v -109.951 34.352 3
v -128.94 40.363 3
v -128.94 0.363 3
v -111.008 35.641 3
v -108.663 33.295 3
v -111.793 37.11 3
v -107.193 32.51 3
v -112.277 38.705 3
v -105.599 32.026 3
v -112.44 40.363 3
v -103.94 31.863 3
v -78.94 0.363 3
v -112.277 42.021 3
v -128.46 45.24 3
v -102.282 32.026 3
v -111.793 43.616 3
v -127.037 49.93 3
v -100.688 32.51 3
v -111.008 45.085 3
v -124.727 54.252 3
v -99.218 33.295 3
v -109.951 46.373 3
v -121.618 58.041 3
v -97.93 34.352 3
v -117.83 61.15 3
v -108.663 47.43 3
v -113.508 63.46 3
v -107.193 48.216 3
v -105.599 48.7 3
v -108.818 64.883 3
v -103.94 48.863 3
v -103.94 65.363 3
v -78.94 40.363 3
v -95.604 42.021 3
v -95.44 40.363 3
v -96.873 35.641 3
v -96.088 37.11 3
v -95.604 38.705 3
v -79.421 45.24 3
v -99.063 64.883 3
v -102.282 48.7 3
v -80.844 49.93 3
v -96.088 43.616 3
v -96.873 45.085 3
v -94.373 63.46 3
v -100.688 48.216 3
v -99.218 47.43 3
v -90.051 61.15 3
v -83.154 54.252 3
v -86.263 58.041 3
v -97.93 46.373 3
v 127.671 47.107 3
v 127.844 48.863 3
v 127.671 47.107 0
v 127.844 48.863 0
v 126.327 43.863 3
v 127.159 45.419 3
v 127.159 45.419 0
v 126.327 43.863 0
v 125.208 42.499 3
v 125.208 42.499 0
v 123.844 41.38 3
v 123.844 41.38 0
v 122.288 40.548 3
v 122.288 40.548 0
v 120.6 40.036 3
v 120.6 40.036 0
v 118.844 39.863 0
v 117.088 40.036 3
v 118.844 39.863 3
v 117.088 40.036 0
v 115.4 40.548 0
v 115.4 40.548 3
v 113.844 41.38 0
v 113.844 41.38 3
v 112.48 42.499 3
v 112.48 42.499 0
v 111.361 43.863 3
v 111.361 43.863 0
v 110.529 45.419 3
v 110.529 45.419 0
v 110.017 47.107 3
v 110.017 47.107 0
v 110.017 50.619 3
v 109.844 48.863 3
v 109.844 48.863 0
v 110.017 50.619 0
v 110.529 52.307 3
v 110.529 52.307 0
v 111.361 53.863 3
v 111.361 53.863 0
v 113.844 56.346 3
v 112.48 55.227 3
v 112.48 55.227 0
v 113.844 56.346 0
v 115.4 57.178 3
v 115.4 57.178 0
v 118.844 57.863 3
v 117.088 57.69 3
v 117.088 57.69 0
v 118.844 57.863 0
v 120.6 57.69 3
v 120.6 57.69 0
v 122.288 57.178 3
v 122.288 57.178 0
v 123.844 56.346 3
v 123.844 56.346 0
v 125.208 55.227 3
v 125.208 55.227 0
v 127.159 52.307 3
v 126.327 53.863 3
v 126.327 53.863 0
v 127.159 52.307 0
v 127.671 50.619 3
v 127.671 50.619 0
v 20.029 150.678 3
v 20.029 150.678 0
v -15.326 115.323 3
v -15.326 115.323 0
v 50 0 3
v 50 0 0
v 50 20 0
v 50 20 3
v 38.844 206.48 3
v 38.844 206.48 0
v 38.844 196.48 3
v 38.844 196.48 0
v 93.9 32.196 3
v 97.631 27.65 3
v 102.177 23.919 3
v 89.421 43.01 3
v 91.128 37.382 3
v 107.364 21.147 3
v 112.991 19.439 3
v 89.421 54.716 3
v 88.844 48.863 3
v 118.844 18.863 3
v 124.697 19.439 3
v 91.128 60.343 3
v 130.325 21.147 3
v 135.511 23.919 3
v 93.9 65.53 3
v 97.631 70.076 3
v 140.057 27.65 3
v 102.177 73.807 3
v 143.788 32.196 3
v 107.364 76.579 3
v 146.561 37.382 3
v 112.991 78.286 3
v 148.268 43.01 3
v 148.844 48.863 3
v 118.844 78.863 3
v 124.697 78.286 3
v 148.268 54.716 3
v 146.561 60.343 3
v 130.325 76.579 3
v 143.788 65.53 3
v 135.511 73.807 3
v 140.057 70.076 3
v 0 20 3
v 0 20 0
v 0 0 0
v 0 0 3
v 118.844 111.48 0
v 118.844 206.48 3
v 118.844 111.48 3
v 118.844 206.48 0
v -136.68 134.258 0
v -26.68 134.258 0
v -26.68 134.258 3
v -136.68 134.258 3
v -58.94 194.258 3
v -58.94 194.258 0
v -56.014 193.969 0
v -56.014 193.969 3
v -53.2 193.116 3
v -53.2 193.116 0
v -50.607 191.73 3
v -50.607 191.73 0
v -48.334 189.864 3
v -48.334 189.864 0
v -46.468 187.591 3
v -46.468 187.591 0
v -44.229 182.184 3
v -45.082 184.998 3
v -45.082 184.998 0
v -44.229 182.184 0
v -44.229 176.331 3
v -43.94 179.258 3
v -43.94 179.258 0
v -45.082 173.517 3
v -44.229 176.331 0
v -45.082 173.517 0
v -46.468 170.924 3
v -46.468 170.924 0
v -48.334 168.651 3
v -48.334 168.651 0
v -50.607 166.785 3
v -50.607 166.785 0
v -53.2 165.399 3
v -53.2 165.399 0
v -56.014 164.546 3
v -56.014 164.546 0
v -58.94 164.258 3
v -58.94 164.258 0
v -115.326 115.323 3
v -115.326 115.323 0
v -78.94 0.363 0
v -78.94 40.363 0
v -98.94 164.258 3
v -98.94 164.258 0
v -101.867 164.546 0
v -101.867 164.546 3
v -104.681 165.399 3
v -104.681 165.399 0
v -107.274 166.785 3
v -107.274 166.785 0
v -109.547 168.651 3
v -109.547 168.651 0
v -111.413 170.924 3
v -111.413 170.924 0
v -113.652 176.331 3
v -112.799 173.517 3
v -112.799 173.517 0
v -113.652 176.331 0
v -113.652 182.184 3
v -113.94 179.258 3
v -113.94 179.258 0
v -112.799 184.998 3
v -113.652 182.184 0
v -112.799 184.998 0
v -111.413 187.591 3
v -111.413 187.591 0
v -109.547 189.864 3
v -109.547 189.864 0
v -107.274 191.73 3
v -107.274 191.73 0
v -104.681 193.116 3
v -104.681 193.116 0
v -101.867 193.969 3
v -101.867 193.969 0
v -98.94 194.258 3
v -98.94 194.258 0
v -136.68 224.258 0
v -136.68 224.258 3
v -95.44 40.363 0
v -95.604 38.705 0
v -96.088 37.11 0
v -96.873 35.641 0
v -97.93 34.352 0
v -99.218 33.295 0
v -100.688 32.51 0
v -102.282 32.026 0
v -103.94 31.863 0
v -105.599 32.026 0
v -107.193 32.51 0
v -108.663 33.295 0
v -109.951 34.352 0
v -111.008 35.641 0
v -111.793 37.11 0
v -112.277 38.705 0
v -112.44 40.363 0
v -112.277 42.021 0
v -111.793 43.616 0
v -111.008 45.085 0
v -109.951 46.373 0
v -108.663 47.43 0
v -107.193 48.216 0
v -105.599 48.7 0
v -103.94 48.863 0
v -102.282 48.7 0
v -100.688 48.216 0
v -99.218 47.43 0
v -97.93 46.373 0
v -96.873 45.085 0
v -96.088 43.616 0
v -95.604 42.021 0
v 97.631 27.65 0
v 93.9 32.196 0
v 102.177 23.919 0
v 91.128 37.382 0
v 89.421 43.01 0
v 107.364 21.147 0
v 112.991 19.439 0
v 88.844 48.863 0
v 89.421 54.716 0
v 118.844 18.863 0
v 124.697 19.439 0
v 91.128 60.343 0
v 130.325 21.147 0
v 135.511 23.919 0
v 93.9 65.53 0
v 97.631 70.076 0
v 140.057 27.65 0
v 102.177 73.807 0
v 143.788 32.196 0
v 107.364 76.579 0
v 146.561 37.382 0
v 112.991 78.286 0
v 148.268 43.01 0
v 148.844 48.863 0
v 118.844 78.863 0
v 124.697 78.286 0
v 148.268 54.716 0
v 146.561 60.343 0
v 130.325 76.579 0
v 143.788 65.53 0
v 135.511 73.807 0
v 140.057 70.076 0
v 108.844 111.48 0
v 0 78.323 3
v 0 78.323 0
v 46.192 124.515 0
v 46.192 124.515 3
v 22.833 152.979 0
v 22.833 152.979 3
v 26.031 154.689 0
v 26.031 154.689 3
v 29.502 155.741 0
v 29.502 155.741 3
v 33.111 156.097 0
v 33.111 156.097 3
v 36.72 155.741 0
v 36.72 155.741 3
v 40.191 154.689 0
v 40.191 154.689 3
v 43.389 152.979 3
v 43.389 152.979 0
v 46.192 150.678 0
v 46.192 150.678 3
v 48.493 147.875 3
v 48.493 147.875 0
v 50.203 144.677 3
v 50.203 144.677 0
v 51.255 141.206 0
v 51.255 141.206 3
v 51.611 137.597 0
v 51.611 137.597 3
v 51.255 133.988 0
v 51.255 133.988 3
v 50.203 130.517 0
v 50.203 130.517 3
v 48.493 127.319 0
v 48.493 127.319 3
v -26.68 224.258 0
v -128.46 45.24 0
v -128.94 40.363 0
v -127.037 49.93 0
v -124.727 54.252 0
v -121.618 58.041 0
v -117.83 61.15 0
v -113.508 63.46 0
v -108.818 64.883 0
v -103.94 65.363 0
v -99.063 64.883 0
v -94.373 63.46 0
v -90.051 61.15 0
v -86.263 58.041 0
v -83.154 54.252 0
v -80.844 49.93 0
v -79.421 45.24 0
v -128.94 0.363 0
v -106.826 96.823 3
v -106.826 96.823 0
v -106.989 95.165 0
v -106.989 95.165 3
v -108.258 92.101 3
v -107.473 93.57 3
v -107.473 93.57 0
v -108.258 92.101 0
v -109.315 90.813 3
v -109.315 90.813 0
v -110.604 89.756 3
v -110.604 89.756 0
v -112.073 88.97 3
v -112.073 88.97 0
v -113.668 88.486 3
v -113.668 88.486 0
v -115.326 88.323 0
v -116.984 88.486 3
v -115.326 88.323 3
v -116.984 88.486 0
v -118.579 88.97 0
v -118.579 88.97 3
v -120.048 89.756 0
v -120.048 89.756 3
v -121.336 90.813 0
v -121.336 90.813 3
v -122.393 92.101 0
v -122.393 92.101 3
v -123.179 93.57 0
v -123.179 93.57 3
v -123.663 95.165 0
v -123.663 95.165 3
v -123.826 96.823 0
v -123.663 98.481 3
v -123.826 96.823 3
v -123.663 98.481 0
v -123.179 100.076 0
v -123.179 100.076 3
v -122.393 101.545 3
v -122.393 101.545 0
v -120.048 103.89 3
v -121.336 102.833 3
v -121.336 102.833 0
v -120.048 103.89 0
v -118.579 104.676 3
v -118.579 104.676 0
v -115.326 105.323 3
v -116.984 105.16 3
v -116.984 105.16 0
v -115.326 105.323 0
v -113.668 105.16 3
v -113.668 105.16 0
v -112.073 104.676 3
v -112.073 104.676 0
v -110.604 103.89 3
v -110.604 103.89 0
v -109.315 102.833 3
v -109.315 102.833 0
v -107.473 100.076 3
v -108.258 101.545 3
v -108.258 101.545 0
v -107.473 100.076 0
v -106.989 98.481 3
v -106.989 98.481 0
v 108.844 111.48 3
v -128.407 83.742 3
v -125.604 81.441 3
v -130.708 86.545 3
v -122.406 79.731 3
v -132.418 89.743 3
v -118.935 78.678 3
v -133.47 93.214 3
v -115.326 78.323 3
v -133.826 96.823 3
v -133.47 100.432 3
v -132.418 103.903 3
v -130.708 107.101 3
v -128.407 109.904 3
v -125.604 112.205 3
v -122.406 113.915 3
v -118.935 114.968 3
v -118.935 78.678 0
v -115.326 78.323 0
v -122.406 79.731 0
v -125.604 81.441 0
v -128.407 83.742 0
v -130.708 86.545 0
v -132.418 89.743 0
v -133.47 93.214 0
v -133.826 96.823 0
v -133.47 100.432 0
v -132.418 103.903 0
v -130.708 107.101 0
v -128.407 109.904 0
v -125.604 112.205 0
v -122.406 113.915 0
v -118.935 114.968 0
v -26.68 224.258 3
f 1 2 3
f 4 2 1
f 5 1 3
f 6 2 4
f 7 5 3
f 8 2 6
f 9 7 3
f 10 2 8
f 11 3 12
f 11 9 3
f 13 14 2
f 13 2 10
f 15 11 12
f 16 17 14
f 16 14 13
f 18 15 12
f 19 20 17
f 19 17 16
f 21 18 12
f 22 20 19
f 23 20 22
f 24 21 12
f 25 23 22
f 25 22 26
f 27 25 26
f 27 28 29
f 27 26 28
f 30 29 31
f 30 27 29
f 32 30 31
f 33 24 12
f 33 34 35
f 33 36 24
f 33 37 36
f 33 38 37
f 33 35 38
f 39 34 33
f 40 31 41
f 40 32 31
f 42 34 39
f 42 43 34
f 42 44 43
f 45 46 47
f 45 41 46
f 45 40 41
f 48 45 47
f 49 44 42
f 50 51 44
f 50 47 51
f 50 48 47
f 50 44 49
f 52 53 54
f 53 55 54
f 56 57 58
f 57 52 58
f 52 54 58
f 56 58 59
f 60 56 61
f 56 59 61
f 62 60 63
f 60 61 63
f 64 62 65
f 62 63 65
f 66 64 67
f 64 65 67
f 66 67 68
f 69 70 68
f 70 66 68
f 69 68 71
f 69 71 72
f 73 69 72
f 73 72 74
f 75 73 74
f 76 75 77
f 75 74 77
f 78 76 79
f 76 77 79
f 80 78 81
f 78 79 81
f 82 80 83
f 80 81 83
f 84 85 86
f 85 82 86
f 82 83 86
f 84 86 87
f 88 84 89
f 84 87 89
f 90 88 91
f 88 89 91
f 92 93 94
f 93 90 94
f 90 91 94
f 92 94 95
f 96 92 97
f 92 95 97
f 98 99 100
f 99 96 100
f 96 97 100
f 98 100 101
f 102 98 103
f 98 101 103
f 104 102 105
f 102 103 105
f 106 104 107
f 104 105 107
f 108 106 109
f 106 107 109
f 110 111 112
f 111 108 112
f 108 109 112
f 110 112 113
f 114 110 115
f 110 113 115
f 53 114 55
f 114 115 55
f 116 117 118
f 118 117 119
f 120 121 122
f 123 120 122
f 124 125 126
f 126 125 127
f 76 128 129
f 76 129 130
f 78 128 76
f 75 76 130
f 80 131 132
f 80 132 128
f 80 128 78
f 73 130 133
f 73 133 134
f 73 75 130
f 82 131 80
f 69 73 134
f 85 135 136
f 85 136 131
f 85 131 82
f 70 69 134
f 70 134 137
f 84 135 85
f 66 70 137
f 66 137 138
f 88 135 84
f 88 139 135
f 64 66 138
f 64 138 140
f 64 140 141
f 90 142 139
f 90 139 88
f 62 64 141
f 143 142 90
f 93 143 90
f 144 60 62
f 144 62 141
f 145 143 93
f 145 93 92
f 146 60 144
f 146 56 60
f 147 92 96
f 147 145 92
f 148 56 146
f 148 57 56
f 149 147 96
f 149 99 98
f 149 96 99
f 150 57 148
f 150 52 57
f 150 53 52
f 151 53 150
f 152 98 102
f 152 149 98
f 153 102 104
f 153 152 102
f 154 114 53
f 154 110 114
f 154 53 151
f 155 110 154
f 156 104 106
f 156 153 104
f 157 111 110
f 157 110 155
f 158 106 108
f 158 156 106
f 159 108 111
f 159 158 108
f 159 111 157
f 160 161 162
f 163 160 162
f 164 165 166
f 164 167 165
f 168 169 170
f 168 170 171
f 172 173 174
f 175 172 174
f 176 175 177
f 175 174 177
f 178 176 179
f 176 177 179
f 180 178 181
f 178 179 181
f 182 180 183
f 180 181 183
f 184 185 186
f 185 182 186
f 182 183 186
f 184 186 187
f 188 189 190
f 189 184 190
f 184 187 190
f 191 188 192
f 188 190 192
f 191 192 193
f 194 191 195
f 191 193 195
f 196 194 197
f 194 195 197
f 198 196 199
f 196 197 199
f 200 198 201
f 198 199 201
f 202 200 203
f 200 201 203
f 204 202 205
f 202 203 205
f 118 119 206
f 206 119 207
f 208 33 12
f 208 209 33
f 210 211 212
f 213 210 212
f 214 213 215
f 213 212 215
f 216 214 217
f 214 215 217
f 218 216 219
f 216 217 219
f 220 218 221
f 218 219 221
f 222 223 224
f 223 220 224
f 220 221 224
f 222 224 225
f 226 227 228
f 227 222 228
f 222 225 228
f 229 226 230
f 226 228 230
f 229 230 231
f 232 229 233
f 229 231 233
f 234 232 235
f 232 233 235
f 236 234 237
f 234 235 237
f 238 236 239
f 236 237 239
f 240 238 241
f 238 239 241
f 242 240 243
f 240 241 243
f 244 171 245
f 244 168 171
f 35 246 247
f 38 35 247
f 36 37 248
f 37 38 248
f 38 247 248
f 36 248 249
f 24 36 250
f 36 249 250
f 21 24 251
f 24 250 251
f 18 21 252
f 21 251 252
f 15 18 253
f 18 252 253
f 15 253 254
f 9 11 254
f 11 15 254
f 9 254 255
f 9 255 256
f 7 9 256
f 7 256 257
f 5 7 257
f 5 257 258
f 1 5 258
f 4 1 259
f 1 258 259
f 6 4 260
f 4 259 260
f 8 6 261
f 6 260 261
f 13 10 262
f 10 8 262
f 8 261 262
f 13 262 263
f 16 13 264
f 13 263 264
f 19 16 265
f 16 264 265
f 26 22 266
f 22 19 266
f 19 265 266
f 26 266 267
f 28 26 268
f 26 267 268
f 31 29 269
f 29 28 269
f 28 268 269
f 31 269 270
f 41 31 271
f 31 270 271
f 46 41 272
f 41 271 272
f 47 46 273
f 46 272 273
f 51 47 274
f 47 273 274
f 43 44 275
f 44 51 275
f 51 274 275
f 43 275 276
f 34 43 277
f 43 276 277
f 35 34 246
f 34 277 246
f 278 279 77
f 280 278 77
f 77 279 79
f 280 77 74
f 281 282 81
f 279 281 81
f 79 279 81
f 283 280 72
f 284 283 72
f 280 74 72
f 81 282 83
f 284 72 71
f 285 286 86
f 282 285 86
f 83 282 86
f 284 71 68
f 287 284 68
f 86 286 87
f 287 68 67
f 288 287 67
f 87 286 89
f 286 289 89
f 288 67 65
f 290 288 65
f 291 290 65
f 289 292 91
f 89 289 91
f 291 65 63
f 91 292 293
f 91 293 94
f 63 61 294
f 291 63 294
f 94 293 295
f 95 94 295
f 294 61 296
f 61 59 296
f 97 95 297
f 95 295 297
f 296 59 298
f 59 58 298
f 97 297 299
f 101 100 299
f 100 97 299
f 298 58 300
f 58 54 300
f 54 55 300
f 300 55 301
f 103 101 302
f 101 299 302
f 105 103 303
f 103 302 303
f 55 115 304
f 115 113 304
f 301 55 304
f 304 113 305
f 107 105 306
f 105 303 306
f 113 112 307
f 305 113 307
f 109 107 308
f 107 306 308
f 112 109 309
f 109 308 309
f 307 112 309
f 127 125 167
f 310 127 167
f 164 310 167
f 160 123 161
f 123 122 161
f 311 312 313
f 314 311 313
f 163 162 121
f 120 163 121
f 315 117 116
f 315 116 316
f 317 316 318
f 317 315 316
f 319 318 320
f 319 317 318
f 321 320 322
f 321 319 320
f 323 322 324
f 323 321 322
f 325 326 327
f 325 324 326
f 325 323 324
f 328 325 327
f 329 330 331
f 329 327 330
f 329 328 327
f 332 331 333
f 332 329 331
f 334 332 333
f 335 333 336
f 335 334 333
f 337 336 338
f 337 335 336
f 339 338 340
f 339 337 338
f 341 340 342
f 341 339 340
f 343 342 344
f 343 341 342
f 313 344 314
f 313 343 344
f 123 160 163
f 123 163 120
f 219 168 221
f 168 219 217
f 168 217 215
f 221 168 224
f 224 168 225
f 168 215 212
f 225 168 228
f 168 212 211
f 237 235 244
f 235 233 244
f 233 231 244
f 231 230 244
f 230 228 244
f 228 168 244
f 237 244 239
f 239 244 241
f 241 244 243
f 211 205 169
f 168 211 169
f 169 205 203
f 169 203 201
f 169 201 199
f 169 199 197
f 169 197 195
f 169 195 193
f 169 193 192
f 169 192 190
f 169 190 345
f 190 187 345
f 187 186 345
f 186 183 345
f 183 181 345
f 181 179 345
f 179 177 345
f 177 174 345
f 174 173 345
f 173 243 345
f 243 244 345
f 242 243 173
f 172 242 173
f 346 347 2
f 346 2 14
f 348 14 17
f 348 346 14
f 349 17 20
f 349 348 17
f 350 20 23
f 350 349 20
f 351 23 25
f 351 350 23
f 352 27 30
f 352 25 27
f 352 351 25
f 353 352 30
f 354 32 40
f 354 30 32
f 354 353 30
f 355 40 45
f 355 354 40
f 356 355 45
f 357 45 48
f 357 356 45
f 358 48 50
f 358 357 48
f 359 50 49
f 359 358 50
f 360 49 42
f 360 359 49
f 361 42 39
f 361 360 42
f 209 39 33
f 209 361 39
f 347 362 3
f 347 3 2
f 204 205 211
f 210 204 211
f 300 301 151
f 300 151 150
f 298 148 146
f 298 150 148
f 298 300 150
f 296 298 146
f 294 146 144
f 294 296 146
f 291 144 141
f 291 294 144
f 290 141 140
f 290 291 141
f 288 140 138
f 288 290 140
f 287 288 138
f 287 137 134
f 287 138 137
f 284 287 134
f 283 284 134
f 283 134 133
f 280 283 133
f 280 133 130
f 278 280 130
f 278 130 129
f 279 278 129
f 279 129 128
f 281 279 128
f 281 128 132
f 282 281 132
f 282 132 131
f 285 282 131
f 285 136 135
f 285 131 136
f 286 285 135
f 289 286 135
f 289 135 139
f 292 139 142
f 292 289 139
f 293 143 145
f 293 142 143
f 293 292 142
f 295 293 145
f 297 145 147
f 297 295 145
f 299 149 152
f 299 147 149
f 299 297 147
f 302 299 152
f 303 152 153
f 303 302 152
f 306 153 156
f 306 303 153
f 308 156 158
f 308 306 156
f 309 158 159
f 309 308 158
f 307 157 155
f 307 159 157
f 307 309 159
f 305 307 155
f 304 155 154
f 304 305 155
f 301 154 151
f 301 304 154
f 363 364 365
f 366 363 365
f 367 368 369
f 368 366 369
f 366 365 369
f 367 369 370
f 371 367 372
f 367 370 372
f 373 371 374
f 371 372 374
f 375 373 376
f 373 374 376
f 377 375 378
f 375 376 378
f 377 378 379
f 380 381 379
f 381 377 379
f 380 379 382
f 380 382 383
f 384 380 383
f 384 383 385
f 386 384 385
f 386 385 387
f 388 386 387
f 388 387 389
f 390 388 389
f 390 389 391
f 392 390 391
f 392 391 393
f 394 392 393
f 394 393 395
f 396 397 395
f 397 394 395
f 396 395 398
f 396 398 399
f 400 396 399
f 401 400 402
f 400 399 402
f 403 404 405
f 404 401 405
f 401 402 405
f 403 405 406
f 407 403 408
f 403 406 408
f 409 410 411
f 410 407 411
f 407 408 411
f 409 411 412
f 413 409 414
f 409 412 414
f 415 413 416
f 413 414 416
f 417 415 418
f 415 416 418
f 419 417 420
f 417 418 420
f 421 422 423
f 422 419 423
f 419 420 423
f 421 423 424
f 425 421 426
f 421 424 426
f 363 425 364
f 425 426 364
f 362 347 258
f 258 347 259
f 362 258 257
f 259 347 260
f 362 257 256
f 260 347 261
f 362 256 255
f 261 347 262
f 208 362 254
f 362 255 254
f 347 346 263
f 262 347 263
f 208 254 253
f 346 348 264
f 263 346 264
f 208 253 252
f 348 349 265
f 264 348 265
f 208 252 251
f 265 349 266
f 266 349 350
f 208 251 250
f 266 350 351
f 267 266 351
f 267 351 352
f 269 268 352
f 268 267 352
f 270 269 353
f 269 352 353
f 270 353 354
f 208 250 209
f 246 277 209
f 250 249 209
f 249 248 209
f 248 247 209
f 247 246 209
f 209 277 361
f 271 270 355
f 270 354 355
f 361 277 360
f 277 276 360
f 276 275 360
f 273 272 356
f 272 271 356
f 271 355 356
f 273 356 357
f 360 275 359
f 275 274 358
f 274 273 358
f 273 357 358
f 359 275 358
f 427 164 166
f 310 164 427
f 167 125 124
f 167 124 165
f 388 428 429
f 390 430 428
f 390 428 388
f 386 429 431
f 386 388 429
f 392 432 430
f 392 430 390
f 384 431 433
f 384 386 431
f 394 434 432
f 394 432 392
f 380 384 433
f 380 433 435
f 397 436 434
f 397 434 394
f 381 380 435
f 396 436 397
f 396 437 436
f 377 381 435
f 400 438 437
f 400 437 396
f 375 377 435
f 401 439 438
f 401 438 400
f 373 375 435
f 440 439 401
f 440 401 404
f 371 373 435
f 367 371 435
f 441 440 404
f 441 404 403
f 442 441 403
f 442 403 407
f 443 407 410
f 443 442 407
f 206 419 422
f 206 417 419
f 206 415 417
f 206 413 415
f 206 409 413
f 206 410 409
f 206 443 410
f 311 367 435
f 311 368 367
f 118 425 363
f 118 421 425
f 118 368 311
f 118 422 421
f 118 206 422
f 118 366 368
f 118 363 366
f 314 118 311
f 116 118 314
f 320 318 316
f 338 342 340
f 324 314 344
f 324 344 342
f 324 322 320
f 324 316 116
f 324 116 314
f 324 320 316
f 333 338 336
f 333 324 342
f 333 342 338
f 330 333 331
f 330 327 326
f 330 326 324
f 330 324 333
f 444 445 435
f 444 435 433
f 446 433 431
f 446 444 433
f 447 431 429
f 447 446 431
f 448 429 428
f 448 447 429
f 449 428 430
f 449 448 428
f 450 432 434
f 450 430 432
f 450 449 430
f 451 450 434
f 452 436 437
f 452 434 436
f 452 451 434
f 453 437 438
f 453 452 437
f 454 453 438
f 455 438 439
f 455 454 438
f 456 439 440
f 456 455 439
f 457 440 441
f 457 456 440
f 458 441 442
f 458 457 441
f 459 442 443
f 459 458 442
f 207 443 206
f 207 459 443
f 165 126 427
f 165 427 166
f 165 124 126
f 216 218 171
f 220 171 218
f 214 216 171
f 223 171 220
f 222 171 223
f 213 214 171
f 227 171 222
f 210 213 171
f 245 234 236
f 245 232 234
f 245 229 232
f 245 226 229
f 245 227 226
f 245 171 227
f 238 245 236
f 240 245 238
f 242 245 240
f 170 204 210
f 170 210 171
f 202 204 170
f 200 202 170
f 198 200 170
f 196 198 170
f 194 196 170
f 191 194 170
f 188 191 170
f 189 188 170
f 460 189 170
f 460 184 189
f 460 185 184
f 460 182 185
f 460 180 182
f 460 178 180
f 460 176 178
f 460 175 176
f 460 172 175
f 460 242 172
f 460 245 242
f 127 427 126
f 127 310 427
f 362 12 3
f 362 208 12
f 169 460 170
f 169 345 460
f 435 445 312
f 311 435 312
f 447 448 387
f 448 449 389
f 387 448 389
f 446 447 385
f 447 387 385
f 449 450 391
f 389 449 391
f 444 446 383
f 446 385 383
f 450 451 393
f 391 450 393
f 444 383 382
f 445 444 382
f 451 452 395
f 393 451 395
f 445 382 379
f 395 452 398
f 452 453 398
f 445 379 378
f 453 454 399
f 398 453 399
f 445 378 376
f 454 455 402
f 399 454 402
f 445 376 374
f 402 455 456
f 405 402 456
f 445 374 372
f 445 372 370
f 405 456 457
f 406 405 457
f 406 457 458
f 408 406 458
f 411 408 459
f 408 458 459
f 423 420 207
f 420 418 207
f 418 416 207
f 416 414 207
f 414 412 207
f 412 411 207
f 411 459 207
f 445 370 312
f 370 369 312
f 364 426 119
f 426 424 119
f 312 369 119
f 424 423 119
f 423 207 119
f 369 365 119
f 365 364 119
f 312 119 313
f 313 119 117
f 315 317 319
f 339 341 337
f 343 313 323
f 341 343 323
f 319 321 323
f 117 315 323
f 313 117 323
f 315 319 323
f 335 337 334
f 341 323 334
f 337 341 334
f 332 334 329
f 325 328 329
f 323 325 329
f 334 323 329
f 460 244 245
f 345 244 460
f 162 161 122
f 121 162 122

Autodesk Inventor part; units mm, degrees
ref_plane "YZ Plane" through (0, 0, 0) normal (1, 0, 0) x (0, 1, 0)
ref_plane "XZ Plane" through (0, 0, 0) normal (0, 1, 0) x (-1, 0, 0)
ref_plane "XY Plane" through (0, 0, 0) normal (0, 0, 1) x (1, 0, 0)
sketch "Sketch1" plane through (0, 0, 0) normal (0, 0, 1) x (1, 0, 0)
  line L0 (0, 0) -> (50, 0)
  line L1 (50, 0) -> (50, 20)
  line L2 (50, 20) -> (0, 20)
  line L3 (0, 20) -> (0, 0)
  line L4 (-15.3259, 115.323) -> (-115.3259, 115.323)
  arc A0 (-115.3259, 115.323) -> (-115.3259, 78.323) centre (-115.3259, 96.823) ccw
  line L5 (-115.3259, 78.323) -> (0, 78.323)
  line L6 (0, 78.323) -> (46.1924, 124.5154)
  arc A1 (46.1924, 124.5154) -> (20.0294, 150.6784) centre (33.1109, 137.5969) ccw
  line L7 (20.0294, 150.6784) -> (-15.3259, 115.323)
  circle A2 centre (-115.3259, 96.823) radius 8.5
  line L8 (0, 0) -> (0, 78.323) construction
  circle A3 centre (-103.9405, 40.3629) radius 8.5
  line L9 (-128.9405, 0.3629) -> (-128.9405, 40.3629)
  arc A4 (-78.9405, 40.3629) -> (-128.9405, 40.3629) centre (-103.9405, 40.3629) ccw
  line L10 (-78.9405, 40.3629) -> (-78.9405, 0.3629)
  line L11 (-78.9405, 0.3629) -> (-128.9405, 0.3629)
  line L12 (38.8442, 206.4801) -> (118.8442, 206.4801)
  line L13 (118.8442, 206.4801) -> (118.8442, 111.4801)
  line L14 (38.8442, 206.4801) -> (38.8442, 196.4801)
  line L15 (118.8442, 111.4801) -> (108.8442, 111.4801)
  line L16 (108.8442, 111.4801) -> (38.8442, 196.4801)
  line L17 (-136.6803, 224.2575) -> (-26.6803, 224.2575)
  line L18 (-26.6803, 224.2575) -> (-26.6803, 134.2575)
  line L19 (-26.6803, 134.2575) -> (-136.6803, 134.2575)
  line L20 (-136.6803, 134.2575) -> (-136.6803, 224.2575)
  line L21 (-98.9405, 179.2575) -> (-58.9405, 179.2575) construction
  line L22 (-98.9405, 194.2575) -> (-58.9405, 194.2575)
  line L23 (-58.9405, 164.2575) -> (-98.9405, 164.2575)
  arc A5 (-98.9405, 194.2575) -> (-98.9405, 164.2575) centre (-98.9405, 179.2575) ccw
  arc A6 (-58.9405, 164.2575) -> (-58.9405, 194.2575) centre (-58.9405, 179.2575) ccw
  circle A7 centre (118.8442, 48.8629) radius 30
  circle A8 centre (118.8442, 48.8629) radius 9
  line L24 (-136.6803, 218.2575) -> (-26.6803, 218.2575) construction
  point P0 (-78.9405, 179.2575)
  dimension "d22" = 50
  dimension "d23" = 20
  dimension "d24" = 17
  dimension "d25" = 10
  dimension "d26" = 100
  dimension "d28" = 135
  dimension "d29" = 50
  dimension "d30" = 17
  dimension "d31" = 25
  dimension "d32" = 40
  dimension "d33" = 80
  dimension "d34" = 95
  dimension "d35" = 10
  dimension "d36" = 10
  dimension "d37" = 110
  dimension "d38" = 30
  dimension "d39" = 40
  dimension "d40" = 60
  dimension "d41" = 18
  dimension "d42" = 6
  dimension "d43" = 90
extrude "Plate1" add sketch "Sketch1" along normal blind 3
equation "\"d2\" = Thickness"
equation "\"BendReliefWidth\" = Thickness"
equation "\"BendReliefDepth\" = 0.5 * Thickness"
equation "\"CornerReliefSize\" = 4 * Thickness"
equation "\"MinimumRemnant\" = 2 * Thickness"
equation "\"TransitionRadius\" = BendRadius"
equation "\"JacobiRadiusSize\" = BendRadius"
equation "\"GapSize\" = Thickness"
equation "\"Thickness\" = 3"
equation "\"BendRadius\" = 5"
properties part number "rings" material "Stainless Steel"
